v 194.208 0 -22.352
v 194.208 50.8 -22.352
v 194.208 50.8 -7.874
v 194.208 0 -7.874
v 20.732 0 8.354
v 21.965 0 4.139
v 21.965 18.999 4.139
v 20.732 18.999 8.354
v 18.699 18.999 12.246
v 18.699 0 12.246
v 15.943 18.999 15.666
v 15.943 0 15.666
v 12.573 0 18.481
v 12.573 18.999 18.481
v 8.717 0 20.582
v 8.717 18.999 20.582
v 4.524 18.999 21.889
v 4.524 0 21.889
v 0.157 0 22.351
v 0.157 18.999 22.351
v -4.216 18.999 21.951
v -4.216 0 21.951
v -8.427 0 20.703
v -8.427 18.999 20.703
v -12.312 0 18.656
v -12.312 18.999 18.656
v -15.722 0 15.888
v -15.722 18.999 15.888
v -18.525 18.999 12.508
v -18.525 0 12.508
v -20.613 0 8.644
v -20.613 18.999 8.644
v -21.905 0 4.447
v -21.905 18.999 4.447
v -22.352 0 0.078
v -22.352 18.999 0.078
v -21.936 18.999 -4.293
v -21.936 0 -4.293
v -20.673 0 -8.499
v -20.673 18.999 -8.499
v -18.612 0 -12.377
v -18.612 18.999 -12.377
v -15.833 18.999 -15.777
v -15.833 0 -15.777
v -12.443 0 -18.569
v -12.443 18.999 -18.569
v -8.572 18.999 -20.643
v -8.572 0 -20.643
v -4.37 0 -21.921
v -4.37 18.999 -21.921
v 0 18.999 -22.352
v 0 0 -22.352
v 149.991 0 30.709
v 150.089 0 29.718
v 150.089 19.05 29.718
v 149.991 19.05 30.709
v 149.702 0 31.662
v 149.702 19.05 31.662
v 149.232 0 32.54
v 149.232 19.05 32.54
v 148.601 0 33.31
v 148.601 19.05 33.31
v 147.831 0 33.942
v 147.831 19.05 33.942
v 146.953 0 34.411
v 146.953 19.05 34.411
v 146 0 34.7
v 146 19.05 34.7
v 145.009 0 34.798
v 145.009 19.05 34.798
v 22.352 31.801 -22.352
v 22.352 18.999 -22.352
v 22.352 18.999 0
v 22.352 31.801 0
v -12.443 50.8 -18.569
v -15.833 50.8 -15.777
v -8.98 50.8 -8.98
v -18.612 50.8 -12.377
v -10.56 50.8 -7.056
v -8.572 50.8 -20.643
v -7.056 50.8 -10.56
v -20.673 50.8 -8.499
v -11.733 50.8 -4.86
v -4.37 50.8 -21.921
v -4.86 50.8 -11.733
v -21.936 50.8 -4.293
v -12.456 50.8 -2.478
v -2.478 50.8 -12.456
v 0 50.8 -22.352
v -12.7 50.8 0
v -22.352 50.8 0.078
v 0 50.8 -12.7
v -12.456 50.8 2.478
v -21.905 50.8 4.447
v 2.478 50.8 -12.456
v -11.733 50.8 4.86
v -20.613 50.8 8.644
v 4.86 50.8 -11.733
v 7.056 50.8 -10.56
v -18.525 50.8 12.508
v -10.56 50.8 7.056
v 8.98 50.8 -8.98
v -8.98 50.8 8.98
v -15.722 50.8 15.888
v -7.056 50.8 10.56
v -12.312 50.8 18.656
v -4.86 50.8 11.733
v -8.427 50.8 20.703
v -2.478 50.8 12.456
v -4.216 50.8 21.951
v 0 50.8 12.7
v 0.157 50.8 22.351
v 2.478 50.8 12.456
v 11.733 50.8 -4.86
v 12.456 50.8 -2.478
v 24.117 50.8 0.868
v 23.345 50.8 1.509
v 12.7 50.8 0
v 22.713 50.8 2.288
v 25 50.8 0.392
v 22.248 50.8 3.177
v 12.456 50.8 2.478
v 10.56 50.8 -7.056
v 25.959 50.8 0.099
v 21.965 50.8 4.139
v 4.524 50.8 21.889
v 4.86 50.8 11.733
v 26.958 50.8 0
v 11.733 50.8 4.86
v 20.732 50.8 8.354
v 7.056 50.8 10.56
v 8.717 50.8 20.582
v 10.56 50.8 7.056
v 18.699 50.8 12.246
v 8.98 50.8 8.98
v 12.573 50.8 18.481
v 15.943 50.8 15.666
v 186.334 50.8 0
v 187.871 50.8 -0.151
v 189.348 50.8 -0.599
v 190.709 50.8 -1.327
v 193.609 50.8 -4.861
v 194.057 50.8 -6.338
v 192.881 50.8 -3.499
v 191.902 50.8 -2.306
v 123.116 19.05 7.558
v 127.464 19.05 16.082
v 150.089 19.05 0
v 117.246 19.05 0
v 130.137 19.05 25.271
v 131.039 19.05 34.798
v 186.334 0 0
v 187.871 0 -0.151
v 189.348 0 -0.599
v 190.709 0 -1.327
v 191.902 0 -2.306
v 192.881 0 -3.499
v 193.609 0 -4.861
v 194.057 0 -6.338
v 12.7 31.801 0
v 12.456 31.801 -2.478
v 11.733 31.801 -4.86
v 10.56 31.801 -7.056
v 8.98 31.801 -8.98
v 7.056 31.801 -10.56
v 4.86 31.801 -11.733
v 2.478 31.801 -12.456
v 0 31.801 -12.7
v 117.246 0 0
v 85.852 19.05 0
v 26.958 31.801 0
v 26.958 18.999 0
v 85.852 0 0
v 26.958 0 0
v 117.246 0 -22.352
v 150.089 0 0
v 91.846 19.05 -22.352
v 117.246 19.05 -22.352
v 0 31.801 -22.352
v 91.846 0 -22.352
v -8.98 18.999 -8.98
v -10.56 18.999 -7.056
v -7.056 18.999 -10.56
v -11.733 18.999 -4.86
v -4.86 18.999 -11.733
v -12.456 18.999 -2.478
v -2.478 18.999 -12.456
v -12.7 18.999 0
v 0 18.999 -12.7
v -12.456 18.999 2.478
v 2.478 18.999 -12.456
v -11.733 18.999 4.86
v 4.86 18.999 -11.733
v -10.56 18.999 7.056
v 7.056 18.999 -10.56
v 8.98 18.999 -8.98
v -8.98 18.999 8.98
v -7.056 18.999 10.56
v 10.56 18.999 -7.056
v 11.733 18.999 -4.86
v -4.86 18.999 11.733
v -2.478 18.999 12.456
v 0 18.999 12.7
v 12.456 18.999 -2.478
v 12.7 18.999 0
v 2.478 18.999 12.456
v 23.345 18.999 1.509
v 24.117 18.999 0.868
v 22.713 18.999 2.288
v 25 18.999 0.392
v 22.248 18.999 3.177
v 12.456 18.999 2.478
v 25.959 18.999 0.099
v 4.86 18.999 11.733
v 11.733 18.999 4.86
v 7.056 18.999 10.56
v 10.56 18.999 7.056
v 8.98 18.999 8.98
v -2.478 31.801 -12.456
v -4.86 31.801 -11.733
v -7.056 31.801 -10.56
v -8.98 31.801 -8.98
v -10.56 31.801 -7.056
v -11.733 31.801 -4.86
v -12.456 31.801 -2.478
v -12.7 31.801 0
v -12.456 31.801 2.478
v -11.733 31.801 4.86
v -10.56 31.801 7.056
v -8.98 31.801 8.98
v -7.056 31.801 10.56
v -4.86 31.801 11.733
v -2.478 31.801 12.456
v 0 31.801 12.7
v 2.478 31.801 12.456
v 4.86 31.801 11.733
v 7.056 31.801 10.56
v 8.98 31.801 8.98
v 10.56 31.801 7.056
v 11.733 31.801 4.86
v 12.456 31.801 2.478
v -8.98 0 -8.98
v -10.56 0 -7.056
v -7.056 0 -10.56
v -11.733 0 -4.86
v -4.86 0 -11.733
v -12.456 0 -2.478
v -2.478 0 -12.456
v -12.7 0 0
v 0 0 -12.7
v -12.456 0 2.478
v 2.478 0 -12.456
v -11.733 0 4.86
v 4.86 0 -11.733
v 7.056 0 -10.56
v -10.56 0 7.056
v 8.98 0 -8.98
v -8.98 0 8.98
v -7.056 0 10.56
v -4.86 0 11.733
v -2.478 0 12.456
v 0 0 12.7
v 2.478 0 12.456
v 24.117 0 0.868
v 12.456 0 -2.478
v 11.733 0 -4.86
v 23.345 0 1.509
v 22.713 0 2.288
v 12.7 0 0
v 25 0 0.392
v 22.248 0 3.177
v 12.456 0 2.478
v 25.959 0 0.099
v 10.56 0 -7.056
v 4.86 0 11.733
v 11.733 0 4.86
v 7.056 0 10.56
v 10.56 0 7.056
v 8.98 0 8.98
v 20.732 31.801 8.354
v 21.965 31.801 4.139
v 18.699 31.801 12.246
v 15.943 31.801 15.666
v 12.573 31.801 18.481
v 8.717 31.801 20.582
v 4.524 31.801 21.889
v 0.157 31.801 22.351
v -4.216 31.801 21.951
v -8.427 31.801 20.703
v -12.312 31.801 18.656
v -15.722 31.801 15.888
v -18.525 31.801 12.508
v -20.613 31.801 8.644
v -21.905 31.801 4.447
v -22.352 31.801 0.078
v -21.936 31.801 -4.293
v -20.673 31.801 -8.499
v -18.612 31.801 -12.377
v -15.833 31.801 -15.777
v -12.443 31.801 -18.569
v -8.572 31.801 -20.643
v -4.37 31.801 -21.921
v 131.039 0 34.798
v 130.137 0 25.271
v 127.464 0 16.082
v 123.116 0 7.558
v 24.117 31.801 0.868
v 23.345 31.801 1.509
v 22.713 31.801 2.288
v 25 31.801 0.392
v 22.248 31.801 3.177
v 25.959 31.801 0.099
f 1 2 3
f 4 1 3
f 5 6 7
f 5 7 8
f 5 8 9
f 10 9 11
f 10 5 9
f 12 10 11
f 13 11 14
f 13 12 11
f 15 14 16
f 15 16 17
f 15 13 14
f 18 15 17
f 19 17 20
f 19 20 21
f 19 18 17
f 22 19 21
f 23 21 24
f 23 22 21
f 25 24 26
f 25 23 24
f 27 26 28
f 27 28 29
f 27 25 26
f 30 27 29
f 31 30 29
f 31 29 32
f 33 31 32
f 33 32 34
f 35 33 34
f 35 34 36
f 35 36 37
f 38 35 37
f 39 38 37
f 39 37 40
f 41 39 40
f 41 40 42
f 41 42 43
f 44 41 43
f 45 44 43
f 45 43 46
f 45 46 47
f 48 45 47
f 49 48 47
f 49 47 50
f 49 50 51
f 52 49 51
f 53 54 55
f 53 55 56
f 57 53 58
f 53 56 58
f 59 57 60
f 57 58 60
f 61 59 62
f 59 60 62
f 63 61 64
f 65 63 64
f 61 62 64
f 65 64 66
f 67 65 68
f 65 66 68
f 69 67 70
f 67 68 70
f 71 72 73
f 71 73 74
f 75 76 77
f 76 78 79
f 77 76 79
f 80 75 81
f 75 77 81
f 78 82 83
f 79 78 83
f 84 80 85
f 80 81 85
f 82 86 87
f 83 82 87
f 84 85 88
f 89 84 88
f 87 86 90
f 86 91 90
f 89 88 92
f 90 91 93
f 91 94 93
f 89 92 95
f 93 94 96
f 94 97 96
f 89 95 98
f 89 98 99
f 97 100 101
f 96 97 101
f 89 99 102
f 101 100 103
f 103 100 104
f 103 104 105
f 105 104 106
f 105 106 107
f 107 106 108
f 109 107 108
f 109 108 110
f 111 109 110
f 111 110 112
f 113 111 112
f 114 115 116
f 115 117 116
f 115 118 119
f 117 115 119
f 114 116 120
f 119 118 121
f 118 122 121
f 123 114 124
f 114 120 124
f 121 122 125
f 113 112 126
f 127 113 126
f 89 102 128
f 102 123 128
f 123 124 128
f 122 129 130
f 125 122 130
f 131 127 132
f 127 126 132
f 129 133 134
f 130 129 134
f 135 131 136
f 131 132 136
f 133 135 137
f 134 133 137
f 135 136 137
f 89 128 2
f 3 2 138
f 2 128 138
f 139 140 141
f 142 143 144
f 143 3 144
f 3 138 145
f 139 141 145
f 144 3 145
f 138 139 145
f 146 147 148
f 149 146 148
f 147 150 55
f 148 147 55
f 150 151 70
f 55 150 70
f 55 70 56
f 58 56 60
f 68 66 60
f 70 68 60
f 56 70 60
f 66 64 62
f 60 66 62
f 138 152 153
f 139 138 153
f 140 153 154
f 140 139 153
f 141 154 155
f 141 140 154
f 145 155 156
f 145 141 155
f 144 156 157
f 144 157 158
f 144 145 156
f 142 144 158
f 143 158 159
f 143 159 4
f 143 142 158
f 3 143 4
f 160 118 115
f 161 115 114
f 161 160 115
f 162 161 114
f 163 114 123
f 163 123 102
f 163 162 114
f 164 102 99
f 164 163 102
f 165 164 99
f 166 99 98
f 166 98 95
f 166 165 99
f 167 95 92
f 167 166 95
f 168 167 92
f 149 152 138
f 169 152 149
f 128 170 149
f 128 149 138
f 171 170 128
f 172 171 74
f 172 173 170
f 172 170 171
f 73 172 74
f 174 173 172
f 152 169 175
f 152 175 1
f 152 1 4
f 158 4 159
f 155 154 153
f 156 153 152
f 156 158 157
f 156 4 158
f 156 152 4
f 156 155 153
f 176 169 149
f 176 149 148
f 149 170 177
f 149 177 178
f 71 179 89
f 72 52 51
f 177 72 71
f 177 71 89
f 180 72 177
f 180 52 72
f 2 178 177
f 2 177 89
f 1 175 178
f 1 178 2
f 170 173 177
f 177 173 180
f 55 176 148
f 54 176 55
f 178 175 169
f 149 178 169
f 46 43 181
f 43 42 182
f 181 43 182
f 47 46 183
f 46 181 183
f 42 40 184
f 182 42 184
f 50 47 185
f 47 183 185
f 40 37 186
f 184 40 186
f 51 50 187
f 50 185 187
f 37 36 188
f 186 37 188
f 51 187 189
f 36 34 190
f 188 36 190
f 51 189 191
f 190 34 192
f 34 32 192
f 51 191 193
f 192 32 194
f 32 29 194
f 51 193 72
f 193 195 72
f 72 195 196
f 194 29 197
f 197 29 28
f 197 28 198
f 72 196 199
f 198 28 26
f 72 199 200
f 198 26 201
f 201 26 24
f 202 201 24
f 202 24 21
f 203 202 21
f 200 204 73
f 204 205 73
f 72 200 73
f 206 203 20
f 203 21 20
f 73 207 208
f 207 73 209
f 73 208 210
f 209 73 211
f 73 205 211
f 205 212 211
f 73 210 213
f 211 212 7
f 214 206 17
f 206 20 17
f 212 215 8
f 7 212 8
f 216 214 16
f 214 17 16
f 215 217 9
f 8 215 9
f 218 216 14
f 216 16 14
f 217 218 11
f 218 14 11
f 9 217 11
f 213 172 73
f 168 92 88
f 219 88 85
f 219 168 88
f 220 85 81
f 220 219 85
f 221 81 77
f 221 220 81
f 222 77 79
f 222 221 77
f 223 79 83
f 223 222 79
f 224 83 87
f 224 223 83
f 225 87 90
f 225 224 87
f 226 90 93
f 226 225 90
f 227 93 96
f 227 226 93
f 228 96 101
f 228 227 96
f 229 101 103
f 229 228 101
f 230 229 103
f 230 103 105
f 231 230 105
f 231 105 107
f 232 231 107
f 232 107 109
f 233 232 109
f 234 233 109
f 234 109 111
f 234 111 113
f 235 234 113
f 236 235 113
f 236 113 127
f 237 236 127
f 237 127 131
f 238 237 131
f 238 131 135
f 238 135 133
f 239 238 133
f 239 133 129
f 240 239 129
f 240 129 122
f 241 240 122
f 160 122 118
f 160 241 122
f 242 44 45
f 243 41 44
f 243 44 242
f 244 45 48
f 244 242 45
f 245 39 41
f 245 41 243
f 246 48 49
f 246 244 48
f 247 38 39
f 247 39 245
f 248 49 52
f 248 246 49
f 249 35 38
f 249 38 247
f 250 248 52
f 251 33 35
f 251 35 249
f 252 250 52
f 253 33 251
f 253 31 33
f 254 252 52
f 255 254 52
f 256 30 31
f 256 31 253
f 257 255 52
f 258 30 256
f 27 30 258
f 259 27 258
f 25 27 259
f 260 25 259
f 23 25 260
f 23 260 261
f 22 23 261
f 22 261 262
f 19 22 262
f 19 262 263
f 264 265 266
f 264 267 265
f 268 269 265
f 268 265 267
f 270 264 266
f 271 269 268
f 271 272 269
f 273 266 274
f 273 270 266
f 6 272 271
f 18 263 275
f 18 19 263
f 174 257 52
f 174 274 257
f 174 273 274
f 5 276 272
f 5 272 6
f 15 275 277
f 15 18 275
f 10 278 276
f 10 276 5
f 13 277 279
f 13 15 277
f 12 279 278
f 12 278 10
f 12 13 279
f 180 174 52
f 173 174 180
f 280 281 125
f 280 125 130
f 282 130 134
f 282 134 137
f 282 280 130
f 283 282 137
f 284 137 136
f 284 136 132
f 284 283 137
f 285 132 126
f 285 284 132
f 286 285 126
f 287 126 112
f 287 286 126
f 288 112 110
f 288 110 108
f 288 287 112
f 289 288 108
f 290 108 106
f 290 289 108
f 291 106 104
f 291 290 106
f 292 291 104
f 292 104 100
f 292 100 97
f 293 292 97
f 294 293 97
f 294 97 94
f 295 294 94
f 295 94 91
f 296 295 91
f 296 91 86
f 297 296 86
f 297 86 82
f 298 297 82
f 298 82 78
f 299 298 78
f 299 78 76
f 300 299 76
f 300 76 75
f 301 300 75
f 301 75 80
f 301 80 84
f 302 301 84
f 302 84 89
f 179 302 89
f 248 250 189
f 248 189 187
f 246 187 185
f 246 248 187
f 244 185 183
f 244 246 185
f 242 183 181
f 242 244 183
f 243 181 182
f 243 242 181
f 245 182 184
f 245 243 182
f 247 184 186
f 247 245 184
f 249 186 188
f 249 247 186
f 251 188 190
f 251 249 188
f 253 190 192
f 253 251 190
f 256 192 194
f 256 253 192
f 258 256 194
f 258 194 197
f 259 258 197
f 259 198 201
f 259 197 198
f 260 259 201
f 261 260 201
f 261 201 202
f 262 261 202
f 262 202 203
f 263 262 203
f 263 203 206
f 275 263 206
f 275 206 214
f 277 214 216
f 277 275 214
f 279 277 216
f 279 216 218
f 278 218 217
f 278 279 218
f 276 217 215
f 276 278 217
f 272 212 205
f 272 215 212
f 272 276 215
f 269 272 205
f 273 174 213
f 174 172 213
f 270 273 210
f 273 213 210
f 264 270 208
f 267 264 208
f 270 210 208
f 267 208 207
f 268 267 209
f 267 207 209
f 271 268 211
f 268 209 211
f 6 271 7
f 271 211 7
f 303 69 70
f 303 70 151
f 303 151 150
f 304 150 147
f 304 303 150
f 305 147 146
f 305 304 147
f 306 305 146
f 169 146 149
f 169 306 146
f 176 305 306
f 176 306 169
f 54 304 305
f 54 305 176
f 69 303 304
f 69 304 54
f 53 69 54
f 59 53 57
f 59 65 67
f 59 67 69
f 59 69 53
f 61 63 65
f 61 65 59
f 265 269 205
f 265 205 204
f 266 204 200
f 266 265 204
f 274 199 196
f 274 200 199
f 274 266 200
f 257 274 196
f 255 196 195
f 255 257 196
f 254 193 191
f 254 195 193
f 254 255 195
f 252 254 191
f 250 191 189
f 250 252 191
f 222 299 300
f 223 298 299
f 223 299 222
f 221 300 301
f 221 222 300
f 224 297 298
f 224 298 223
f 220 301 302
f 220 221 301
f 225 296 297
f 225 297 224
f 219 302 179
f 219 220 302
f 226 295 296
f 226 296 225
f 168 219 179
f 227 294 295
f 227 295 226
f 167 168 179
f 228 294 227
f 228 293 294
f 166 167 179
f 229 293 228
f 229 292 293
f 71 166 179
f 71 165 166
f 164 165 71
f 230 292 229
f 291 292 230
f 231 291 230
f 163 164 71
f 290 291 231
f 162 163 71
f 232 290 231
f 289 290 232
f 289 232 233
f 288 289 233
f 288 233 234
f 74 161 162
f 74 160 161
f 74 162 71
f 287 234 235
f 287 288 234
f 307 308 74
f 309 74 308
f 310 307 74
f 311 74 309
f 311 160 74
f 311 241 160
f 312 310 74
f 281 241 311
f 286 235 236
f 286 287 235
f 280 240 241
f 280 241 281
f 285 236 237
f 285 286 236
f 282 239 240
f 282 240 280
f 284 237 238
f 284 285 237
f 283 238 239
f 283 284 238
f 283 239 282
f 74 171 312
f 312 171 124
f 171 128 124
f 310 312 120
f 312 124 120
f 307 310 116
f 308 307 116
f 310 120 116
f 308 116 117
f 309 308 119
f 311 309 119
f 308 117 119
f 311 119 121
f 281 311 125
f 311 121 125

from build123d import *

# Parameters (mm, degrees)
F1_DEPTH = 50.8
F2_DEPTH = 19.05
F3_DEPTH = 19.05
F4_W     = 50.9246974253
F4_H     = 12.8016
F5_DEPTH = 25.4
F6_R     = 5.08
F7_R     = 7.874
F8_R     = 5.08


with BuildPart() as f1:
    # F0 (on Front) → F1 (new body)
    with BuildSketch(Plane.XZ):
        Polygon((117.2464, 0), (117.2464, -22.352), (194.2084, -22.352), (194.2084, 0), (150.0886, 0), align=None)
        Polygon((85.852, 0), (91.8464, -22.352), (117.2464, -22.352), (117.2464, 0), align=None)
        with BuildLine():
            ThreePointArc((22.352, 0), (-15.8052507731, 15.8052507731), (0, -22.352))
            Line((0, -22.352), (91.8464, -22.352))
            Line((91.8464, -22.352), (85.852, 0))
            Line((85.852, 0), (22.352, 0))
        make_face()
        with BuildLine():
            ThreePointArc((0, -12.7), (-8.9802561211, 8.9802561211), (12.7, 0))
            ThreePointArc((12.7, 0), (8.9802561211, -8.9802561211), (0, -12.7))
        make_face(mode=Mode.SUBTRACT)
    extrude(amount=-F1_DEPTH)

    # F0 (on Front) → F3 (cut)
    with BuildSketch(Plane.XZ):
        Polygon((85.852, 0), (91.8464, -22.352), (117.2464, -22.352), (117.2464, 0), align=None)
    extrude(amount=-F3_DEPTH, mode=Mode.SUBTRACT)

    # F4 (on face) → F5 (cut, symmetric)
    with BuildSketch(Plane.XY):
        with Locations((-3.1103487127, 25.4)):
            Rectangle(F4_W, F4_H)
    extrude(amount=F5_DEPTH, both=True, mode=Mode.SUBTRACT)

    # F6
    f6_edges = [f1.edges().sort_by_distance(p)[0] for p in [
        (22.352, 9.4996, 0),
        (22.352, 41.3004, 0),
    ]]
    fillet(f6_edges, radius=F6_R)

    # F7
    f7_edges = [f1.edges().sort_by_distance(p)[0] for p in [
        (194.2084, 25.4, 0),
    ]]
    fillet(f7_edges, radius=F7_R)


with BuildPart() as f2:
    # F0 (on Front) → F2 (new body)
    with BuildSketch(Plane.XZ):
        with BuildLine():
            ThreePointArc((131.0386, 34.798), (127.4644153616, 16.0823576341), (117.2464, 0))
            Line((117.2464, 0), (150.0886, 0))
            Line((150.0886, 0), (150.0886, 34.798))
            Line((150.0886, 34.798), (131.0386, 34.798))
        make_face()
    extrude(amount=-F2_DEPTH)

    # F8
    f8_edges = [f2.edges().sort_by_distance(p)[0] for p in [
        (150.0886, 9.525, 34.798),
    ]]
    fillet(f8_edges, radius=F8_R)


solid = Compound([f1.part, f2.part])
